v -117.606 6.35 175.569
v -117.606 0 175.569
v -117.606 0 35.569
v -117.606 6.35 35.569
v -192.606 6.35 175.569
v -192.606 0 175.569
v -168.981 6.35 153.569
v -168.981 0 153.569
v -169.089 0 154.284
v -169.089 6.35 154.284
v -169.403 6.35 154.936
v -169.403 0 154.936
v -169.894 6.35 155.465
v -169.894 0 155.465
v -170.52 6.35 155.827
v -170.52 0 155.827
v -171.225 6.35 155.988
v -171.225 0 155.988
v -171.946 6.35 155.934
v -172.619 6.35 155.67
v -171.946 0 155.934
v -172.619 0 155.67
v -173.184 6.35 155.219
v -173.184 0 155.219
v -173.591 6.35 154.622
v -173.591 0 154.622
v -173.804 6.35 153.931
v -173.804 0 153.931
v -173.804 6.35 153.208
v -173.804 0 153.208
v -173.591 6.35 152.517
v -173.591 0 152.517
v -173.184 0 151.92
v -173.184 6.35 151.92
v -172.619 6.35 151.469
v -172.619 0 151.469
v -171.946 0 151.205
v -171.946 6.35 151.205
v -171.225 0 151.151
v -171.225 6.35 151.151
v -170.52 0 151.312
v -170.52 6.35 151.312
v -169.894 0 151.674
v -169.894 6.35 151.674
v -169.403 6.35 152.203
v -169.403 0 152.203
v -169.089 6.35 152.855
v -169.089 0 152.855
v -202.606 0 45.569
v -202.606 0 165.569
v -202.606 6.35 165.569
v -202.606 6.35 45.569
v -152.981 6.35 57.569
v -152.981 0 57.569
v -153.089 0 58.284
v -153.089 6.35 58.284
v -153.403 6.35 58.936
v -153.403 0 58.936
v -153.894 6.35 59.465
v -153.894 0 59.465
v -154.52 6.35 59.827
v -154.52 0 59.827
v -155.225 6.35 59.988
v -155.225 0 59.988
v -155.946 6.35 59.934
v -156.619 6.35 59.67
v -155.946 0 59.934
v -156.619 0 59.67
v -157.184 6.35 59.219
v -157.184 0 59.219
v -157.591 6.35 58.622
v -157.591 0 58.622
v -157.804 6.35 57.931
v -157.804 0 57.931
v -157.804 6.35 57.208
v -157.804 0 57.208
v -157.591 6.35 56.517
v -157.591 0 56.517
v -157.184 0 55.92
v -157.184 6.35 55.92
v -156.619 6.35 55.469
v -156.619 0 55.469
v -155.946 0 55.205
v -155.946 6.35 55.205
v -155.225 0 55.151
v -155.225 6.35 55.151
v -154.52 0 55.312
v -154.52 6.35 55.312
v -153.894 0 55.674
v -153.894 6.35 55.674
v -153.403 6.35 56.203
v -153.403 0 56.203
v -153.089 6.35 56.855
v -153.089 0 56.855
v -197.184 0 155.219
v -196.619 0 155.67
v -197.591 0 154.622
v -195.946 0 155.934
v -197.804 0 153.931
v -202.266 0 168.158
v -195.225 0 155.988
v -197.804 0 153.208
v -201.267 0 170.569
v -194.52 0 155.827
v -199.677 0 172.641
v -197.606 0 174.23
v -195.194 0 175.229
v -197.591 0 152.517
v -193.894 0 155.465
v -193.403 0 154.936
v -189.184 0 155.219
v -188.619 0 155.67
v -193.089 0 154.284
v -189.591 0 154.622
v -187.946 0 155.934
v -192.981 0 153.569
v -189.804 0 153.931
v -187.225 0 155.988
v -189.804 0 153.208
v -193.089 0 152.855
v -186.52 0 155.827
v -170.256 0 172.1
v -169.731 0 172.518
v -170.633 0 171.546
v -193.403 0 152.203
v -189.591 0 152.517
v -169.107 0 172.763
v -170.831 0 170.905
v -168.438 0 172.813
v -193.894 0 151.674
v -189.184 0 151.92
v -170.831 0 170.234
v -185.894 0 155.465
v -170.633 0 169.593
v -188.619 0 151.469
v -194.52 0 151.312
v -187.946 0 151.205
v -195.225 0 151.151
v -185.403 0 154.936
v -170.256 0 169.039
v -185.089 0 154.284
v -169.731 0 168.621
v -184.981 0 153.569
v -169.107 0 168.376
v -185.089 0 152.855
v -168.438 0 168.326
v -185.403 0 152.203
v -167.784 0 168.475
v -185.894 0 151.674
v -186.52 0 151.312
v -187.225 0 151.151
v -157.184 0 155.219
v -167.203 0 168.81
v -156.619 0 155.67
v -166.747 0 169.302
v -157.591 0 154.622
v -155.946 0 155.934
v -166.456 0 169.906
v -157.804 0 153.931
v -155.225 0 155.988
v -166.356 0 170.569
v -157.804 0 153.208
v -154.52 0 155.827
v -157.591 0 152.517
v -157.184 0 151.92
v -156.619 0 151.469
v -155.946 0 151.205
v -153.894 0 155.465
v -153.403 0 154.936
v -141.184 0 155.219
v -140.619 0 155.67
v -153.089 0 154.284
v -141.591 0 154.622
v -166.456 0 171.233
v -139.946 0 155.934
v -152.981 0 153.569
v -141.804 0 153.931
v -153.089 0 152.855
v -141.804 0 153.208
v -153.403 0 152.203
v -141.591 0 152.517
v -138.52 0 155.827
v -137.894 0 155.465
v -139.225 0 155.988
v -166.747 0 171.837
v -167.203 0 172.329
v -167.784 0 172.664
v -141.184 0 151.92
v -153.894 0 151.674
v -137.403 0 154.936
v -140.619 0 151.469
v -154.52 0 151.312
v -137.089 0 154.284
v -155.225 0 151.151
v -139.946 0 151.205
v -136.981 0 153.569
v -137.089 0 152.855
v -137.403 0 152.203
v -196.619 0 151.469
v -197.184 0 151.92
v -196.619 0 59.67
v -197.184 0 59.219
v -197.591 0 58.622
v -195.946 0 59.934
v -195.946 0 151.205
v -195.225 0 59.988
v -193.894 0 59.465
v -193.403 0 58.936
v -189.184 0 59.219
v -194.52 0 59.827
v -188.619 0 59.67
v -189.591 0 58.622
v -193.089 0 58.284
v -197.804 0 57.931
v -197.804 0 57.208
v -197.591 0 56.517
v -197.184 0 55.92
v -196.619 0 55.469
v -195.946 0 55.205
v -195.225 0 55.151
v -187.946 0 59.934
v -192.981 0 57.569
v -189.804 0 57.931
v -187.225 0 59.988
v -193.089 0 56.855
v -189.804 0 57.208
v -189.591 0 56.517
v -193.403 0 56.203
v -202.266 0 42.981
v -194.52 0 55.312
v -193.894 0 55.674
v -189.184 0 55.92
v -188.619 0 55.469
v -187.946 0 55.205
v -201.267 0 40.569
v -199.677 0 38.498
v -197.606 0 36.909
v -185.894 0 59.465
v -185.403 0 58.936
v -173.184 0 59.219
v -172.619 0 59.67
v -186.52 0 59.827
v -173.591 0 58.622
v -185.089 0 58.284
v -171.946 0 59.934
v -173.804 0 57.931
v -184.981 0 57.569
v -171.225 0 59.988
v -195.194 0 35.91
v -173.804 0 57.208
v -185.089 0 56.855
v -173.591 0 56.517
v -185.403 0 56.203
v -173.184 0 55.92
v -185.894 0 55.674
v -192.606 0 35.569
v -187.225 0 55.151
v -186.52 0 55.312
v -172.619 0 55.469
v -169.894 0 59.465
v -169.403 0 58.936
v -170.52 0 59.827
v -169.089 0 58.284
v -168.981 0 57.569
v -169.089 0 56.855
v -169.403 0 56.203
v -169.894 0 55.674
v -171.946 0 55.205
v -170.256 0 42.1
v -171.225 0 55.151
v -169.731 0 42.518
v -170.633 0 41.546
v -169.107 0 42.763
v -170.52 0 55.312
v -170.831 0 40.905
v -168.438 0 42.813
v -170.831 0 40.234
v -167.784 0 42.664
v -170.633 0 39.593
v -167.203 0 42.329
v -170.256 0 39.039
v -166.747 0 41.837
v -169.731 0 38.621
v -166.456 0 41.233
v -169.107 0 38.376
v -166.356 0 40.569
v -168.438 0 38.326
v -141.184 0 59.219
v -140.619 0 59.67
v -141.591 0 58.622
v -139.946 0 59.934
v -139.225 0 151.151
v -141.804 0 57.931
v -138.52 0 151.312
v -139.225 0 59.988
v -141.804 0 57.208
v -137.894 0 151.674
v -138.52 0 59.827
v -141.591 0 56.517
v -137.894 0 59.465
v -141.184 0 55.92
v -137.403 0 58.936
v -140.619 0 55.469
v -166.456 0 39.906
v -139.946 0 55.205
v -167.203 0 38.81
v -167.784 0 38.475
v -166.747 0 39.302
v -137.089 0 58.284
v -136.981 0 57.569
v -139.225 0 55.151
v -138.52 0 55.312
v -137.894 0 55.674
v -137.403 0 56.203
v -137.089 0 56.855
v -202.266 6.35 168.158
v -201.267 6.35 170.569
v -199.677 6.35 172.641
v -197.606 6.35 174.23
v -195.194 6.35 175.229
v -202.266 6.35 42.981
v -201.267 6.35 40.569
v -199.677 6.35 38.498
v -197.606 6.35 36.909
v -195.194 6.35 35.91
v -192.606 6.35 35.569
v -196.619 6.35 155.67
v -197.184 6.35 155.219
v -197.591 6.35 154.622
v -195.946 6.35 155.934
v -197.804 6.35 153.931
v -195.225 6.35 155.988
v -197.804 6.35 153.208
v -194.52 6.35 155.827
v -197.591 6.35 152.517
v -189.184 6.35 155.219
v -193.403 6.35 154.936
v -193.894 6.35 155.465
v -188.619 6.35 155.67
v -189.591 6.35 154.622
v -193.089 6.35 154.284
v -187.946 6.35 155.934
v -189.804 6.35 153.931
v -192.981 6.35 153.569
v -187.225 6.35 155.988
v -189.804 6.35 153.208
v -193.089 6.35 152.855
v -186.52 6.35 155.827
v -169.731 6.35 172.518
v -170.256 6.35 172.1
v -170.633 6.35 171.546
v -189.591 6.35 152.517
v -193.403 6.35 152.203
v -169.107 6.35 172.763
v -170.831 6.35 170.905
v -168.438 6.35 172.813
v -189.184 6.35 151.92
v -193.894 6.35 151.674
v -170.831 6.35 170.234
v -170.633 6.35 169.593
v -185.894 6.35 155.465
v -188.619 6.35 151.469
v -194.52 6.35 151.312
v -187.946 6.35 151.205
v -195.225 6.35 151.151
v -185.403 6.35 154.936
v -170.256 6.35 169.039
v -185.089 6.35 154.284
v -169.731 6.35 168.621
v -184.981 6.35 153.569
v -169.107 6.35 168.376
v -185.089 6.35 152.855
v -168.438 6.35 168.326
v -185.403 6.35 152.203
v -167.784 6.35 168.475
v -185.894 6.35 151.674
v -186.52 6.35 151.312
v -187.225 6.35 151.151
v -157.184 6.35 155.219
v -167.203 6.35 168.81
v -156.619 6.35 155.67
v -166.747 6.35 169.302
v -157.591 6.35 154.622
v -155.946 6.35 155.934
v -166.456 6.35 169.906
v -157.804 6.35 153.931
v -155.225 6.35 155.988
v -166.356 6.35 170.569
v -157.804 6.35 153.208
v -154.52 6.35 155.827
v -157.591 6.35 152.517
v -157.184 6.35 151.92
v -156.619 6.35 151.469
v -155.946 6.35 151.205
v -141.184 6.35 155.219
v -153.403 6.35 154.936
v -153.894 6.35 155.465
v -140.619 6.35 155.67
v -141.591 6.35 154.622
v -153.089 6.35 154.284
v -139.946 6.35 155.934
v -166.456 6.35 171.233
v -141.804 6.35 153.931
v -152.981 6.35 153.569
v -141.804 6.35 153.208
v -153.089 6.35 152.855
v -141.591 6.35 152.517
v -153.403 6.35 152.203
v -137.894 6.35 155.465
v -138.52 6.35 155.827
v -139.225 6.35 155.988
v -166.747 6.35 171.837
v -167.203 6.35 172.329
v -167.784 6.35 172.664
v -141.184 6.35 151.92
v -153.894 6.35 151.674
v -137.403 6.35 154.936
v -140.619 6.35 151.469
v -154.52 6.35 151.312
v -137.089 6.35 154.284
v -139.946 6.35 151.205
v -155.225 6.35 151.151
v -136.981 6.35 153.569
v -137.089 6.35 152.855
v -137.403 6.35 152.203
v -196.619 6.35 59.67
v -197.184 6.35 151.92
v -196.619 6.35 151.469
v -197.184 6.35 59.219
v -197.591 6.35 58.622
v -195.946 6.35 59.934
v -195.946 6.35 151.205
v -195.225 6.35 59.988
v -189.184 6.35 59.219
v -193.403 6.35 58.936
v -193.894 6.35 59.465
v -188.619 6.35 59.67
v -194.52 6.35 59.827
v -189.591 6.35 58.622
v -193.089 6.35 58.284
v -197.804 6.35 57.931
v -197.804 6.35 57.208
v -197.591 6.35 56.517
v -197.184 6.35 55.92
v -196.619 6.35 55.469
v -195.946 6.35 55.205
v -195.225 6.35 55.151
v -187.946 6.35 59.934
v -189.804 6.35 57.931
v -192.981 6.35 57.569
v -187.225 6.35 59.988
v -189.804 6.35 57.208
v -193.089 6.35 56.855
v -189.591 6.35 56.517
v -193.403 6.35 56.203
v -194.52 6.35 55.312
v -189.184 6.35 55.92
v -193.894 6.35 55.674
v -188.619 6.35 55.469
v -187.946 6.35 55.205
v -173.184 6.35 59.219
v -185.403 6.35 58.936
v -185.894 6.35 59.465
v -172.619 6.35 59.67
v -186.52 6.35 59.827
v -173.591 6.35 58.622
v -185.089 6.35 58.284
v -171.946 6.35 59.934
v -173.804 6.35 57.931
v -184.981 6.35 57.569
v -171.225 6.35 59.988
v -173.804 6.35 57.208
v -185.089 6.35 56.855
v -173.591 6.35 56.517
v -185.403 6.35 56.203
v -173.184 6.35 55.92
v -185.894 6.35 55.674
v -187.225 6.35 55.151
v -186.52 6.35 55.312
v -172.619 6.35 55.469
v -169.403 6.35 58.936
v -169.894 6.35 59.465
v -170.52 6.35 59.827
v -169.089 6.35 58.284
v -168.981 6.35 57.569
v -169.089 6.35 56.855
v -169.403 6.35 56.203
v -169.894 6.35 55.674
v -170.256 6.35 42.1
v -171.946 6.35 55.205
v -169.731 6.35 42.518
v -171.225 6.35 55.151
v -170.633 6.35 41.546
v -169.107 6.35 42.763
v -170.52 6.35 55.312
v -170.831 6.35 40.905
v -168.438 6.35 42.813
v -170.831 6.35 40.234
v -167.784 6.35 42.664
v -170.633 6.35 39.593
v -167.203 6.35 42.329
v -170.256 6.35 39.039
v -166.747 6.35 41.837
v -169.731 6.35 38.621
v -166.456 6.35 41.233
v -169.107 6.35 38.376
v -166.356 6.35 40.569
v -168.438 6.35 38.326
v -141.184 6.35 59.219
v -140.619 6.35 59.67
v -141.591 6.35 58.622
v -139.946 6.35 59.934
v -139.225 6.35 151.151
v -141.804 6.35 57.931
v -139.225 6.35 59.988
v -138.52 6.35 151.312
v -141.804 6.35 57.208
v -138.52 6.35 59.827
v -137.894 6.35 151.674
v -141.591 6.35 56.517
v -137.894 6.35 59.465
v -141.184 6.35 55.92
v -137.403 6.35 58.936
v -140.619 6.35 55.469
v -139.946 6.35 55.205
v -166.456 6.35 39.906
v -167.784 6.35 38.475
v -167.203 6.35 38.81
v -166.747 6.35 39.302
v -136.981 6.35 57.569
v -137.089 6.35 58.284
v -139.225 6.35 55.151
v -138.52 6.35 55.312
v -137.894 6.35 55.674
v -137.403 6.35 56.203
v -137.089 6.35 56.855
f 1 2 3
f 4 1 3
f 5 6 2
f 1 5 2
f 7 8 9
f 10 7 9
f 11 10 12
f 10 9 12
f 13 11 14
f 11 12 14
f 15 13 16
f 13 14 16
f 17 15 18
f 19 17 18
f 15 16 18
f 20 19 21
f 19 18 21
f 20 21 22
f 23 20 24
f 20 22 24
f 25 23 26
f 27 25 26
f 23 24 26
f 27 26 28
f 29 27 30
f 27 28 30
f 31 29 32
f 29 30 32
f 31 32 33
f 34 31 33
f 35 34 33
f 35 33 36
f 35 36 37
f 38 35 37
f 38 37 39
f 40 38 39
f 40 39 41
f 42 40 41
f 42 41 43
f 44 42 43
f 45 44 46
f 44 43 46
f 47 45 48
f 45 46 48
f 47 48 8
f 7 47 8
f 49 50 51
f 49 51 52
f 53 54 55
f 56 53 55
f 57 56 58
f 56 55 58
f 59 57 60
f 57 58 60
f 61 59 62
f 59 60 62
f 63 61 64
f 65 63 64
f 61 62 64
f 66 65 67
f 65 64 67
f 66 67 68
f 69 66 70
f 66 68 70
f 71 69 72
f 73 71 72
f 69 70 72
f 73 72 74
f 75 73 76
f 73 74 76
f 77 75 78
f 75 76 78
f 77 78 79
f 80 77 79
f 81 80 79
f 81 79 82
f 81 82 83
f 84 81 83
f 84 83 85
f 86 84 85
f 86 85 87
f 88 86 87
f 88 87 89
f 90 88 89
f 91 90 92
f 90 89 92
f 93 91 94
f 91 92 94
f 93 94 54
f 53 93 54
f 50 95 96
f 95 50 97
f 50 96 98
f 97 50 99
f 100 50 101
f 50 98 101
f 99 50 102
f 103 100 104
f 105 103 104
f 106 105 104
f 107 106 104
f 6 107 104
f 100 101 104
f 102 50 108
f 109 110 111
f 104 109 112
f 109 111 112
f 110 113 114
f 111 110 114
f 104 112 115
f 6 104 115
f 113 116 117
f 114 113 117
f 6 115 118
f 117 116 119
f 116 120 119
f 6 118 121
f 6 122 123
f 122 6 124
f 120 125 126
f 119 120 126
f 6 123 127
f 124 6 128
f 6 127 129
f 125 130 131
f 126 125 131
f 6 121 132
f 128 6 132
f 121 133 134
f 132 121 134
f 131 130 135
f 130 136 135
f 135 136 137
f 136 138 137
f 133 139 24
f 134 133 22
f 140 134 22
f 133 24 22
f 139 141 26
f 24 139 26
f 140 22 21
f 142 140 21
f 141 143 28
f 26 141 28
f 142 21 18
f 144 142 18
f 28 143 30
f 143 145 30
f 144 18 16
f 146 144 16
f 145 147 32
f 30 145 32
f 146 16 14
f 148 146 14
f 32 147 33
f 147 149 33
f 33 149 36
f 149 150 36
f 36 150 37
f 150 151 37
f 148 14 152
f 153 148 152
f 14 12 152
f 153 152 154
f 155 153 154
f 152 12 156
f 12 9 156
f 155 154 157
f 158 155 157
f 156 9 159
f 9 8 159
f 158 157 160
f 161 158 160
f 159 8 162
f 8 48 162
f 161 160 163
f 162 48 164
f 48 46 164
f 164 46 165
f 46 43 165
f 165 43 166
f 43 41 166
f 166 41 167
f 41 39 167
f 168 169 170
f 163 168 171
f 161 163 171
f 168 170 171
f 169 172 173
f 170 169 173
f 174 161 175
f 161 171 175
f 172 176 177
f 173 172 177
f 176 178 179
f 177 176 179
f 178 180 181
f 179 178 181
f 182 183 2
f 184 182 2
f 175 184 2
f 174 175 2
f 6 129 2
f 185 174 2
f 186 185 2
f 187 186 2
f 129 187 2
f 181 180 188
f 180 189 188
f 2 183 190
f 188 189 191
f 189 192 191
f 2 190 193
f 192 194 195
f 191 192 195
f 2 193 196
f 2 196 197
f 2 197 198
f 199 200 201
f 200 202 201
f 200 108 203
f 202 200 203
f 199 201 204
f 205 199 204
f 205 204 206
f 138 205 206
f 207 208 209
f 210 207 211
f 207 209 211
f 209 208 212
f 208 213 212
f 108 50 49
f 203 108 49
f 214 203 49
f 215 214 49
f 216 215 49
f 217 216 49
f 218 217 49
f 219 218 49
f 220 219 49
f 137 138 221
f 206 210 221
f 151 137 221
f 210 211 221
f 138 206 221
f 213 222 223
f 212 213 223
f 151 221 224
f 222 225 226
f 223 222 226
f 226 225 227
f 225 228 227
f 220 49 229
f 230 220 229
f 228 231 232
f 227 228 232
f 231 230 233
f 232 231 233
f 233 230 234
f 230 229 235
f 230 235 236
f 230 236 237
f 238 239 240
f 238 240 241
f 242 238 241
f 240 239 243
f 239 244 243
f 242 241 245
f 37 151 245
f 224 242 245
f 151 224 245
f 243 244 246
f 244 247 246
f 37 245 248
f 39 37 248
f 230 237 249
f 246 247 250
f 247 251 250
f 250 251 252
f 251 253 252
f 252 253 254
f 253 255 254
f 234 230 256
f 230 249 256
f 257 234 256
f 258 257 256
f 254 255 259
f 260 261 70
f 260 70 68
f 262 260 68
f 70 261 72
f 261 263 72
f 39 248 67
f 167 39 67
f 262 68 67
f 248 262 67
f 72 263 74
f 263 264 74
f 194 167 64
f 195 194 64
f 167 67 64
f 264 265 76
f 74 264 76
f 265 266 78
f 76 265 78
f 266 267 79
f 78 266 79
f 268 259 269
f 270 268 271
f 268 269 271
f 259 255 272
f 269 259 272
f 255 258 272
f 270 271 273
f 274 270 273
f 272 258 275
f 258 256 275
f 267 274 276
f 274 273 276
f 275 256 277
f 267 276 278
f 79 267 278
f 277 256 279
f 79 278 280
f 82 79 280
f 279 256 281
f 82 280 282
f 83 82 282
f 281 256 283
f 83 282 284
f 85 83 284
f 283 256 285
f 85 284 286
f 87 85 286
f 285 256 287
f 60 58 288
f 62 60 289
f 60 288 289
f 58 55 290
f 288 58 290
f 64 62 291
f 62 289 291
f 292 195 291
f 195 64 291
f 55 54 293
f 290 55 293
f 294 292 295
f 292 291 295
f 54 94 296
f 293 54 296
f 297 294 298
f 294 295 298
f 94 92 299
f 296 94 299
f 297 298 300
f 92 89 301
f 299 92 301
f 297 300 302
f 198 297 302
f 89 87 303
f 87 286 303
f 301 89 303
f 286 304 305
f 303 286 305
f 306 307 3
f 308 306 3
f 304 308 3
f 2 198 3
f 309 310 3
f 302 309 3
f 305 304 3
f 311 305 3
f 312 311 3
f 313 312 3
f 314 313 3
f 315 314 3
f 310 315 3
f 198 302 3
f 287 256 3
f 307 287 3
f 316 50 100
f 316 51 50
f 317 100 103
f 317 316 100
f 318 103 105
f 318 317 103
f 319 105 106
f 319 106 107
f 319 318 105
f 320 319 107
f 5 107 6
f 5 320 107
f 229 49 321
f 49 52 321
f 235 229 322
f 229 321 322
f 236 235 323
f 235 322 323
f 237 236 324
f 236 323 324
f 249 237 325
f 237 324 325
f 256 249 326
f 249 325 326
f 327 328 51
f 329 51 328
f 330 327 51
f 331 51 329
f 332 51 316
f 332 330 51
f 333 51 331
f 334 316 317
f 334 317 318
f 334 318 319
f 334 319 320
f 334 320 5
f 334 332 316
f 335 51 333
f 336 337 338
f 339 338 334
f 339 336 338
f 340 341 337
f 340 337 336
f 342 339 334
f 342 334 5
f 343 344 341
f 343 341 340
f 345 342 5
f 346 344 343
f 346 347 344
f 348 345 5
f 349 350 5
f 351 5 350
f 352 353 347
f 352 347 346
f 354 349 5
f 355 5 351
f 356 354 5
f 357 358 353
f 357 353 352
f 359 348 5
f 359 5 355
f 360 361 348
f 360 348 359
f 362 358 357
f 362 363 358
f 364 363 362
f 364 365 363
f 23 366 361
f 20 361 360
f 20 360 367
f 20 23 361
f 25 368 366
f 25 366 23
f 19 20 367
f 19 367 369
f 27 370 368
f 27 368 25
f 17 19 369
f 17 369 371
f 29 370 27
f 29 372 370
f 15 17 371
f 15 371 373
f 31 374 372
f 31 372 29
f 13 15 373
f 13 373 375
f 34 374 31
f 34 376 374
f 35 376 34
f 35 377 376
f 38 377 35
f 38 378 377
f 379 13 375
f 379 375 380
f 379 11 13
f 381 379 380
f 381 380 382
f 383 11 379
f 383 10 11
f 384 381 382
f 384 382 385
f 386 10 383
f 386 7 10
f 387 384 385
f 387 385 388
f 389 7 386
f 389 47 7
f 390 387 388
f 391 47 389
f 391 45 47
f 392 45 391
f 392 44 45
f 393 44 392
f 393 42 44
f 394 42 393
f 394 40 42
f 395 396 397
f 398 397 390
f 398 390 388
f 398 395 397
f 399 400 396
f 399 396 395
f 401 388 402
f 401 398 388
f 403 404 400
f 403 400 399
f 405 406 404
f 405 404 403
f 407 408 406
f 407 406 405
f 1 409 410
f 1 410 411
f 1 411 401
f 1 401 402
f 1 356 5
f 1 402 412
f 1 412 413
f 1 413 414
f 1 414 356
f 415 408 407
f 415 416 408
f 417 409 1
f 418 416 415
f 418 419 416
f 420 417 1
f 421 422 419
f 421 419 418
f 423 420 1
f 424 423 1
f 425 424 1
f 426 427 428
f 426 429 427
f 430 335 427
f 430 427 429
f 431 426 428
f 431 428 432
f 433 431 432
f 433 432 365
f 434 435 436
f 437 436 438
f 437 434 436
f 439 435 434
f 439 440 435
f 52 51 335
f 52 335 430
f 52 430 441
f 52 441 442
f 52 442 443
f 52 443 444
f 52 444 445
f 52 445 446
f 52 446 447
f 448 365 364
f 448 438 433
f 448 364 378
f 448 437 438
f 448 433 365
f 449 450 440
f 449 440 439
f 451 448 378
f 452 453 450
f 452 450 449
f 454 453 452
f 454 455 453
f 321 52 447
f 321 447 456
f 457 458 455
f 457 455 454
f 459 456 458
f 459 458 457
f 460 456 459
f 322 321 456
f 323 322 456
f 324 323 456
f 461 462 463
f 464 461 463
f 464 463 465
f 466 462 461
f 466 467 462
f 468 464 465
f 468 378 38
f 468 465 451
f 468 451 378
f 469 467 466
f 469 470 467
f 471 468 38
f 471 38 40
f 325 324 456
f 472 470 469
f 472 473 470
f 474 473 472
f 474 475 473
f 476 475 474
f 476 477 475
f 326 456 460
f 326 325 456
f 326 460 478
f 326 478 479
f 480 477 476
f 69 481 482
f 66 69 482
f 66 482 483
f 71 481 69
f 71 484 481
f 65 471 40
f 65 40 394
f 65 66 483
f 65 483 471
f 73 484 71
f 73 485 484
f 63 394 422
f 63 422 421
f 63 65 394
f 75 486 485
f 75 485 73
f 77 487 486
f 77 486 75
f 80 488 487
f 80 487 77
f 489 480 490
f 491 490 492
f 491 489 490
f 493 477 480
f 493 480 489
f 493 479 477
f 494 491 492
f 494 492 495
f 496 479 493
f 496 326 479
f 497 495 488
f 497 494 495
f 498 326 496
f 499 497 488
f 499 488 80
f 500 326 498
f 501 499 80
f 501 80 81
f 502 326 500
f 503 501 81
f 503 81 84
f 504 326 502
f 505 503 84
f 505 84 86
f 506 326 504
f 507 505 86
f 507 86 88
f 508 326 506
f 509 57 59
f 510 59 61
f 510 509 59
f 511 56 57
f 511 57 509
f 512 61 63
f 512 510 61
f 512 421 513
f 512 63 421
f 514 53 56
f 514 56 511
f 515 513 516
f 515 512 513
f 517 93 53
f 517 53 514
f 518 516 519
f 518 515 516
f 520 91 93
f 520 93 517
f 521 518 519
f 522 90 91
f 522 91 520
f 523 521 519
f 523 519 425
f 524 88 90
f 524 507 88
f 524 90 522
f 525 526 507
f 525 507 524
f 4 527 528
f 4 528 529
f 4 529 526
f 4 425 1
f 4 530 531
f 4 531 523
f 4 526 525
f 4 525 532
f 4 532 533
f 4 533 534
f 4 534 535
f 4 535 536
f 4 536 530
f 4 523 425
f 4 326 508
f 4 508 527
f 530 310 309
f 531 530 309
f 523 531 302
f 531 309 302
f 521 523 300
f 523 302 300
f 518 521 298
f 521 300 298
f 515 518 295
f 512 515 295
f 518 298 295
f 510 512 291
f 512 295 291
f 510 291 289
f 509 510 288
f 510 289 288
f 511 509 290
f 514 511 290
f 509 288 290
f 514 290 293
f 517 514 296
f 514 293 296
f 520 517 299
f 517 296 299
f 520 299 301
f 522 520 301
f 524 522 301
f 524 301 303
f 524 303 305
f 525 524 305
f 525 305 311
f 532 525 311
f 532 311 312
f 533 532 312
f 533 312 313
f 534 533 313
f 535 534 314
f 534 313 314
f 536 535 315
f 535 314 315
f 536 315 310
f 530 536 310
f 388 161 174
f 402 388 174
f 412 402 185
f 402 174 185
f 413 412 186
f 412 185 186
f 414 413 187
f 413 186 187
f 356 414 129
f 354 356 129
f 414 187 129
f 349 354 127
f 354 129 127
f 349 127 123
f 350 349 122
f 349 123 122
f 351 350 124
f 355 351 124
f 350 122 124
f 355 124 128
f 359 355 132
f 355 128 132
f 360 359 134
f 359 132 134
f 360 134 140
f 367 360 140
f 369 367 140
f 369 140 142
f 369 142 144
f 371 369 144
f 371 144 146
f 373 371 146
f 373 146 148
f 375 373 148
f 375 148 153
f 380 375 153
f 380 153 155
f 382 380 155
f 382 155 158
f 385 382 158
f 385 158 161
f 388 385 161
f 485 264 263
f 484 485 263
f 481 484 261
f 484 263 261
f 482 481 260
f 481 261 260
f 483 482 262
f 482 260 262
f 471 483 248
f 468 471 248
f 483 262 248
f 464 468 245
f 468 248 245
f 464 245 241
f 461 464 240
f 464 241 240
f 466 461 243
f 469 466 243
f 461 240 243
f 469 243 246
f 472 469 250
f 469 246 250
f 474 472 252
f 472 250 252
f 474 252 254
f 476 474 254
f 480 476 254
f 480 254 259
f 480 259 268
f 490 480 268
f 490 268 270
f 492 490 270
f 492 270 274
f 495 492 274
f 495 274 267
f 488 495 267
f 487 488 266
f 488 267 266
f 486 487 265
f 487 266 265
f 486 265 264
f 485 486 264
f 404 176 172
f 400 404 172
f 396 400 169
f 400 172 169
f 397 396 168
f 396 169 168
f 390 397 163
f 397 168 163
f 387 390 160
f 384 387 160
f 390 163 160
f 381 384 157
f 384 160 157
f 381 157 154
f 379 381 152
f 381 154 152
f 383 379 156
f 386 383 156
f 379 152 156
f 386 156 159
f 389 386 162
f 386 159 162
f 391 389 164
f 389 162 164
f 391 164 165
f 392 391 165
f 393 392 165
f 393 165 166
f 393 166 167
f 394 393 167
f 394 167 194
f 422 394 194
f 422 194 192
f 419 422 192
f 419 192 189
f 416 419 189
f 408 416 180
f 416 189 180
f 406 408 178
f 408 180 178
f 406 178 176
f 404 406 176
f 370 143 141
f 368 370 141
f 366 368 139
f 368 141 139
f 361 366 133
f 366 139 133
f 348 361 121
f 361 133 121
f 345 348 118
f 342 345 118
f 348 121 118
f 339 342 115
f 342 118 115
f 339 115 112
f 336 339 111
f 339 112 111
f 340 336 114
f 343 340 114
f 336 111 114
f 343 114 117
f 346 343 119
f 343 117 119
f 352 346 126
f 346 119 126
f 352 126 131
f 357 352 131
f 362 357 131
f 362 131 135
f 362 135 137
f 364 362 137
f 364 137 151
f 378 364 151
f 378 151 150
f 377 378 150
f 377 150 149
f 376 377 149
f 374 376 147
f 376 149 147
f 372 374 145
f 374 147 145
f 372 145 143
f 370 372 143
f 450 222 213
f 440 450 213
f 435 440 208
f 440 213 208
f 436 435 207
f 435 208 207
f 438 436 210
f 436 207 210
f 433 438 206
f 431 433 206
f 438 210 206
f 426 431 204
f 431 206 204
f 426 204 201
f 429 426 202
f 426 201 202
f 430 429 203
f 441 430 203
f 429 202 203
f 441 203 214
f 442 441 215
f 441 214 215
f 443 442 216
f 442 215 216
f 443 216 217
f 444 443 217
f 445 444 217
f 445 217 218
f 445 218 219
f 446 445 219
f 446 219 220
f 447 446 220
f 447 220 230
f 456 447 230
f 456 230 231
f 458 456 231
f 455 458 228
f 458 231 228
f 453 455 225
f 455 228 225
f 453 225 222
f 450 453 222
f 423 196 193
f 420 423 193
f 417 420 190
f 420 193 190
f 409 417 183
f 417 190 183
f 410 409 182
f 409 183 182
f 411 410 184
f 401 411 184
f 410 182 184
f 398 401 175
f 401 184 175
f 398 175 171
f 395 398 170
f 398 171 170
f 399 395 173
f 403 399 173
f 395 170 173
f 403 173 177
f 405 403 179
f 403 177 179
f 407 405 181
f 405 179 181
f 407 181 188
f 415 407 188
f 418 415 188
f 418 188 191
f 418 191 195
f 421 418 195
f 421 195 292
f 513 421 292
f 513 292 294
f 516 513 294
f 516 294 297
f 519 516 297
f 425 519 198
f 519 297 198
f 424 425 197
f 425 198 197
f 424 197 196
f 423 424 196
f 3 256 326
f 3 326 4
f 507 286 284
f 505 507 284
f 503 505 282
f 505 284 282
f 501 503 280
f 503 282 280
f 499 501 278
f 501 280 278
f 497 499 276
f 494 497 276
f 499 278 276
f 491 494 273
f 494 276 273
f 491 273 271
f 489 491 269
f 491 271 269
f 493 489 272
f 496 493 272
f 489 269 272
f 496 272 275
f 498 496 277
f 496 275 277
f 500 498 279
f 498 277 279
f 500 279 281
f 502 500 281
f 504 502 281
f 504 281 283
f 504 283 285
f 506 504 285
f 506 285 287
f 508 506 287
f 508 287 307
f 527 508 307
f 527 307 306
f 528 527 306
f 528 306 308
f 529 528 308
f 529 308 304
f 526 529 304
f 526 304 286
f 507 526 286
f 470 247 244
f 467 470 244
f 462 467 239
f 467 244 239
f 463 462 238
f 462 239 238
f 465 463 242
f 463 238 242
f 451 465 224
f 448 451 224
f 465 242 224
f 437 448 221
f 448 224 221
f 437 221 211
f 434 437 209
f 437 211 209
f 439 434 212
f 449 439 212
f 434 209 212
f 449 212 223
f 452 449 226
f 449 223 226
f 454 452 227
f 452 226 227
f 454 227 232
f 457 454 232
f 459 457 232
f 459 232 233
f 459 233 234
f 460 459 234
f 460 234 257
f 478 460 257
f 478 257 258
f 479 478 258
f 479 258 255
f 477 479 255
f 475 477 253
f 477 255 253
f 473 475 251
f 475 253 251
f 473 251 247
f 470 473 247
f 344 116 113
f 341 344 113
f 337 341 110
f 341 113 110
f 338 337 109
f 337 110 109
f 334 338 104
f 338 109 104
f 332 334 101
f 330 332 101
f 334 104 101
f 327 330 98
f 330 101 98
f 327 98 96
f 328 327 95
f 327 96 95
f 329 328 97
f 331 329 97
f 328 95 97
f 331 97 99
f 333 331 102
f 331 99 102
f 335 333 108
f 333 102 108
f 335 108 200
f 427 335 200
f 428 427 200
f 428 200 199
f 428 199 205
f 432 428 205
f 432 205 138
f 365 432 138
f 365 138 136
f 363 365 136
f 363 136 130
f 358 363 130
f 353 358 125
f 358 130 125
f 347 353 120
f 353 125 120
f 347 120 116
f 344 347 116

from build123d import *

# Parameters (mm, degrees)
SKETCH1_W           = 85
SKETCH1_H           = 140
BOSS_EXTRUDE1_DEPTH = 6.35
FILLET1_R           = 10
SKETCH2_R           = 2.425
CUT_EXTRUDE1_DEPTH  = 6.35
SKETCH3_R           = 2.25
CUT_EXTRUDE2_DEPTH  = 10


with BuildPart() as part:
    # Sketch1 → Boss-Extrude1 (new body)
    with BuildSketch(Plane(origin=(0, 0, 0), x_dir=(1, 0, 0), z_dir=(0, 1, 0))):
        with Locations((-160.106308554, -105.56948084)):
            Rectangle(SKETCH1_W, SKETCH1_H)
    extrude(amount=BOSS_EXTRUDE1_DEPTH)

    # Fillet1
    fillet1_edges = [part.edges().sort_by_distance(p)[0] for p in [
        (-202.606308554, 3.175, 35.56948084),
        (-202.606308554, 3.175, 175.56948084),
    ]]
    fillet(fillet1_edges, radius=FILLET1_R)

    # Sketch2 → Cut-Extrude1 (cut)
    with BuildSketch(Plane.XZ):
        with Locations((-139.406308554, 57.56948084)):
            Circle(SKETCH2_R)
        with Locations((-155.406308554, 57.56948084)):
            Circle(SKETCH2_R)
        with Locations((-171.406308554, 57.56948084)):
            Circle(SKETCH2_R)
        with Locations((-187.406308554, 57.56948084)):
            Circle(SKETCH2_R)
        with Locations((-195.406308554, 57.56948084)):
            Circle(SKETCH2_R)
        with Locations((-139.406308554, 153.56948084)):
            Circle(SKETCH2_R)
        with Locations((-155.406308554, 153.56948084)):
            Circle(SKETCH2_R)
        with Locations((-171.406308554, 153.56948084)):
            Circle(SKETCH2_R)
        with Locations((-187.406308554, 153.56948084)):
            Circle(SKETCH2_R)
        with Locations((-195.406308554, 153.56948084)):
            Circle(SKETCH2_R)
    extrude(amount=-CUT_EXTRUDE1_DEPTH, mode=Mode.SUBTRACT)

    # Sketch3 → Cut-Extrude2 (cut)
    with BuildSketch(Plane.XZ):
        with Locations((-168.606308554, 170.56948084)):
            Circle(SKETCH3_R)
        with Locations((-168.606308554, 40.56948084)):
            Circle(SKETCH3_R)
    extrude(amount=-CUT_EXTRUDE2_DEPTH, mode=Mode.SUBTRACT)


solid = part.part
